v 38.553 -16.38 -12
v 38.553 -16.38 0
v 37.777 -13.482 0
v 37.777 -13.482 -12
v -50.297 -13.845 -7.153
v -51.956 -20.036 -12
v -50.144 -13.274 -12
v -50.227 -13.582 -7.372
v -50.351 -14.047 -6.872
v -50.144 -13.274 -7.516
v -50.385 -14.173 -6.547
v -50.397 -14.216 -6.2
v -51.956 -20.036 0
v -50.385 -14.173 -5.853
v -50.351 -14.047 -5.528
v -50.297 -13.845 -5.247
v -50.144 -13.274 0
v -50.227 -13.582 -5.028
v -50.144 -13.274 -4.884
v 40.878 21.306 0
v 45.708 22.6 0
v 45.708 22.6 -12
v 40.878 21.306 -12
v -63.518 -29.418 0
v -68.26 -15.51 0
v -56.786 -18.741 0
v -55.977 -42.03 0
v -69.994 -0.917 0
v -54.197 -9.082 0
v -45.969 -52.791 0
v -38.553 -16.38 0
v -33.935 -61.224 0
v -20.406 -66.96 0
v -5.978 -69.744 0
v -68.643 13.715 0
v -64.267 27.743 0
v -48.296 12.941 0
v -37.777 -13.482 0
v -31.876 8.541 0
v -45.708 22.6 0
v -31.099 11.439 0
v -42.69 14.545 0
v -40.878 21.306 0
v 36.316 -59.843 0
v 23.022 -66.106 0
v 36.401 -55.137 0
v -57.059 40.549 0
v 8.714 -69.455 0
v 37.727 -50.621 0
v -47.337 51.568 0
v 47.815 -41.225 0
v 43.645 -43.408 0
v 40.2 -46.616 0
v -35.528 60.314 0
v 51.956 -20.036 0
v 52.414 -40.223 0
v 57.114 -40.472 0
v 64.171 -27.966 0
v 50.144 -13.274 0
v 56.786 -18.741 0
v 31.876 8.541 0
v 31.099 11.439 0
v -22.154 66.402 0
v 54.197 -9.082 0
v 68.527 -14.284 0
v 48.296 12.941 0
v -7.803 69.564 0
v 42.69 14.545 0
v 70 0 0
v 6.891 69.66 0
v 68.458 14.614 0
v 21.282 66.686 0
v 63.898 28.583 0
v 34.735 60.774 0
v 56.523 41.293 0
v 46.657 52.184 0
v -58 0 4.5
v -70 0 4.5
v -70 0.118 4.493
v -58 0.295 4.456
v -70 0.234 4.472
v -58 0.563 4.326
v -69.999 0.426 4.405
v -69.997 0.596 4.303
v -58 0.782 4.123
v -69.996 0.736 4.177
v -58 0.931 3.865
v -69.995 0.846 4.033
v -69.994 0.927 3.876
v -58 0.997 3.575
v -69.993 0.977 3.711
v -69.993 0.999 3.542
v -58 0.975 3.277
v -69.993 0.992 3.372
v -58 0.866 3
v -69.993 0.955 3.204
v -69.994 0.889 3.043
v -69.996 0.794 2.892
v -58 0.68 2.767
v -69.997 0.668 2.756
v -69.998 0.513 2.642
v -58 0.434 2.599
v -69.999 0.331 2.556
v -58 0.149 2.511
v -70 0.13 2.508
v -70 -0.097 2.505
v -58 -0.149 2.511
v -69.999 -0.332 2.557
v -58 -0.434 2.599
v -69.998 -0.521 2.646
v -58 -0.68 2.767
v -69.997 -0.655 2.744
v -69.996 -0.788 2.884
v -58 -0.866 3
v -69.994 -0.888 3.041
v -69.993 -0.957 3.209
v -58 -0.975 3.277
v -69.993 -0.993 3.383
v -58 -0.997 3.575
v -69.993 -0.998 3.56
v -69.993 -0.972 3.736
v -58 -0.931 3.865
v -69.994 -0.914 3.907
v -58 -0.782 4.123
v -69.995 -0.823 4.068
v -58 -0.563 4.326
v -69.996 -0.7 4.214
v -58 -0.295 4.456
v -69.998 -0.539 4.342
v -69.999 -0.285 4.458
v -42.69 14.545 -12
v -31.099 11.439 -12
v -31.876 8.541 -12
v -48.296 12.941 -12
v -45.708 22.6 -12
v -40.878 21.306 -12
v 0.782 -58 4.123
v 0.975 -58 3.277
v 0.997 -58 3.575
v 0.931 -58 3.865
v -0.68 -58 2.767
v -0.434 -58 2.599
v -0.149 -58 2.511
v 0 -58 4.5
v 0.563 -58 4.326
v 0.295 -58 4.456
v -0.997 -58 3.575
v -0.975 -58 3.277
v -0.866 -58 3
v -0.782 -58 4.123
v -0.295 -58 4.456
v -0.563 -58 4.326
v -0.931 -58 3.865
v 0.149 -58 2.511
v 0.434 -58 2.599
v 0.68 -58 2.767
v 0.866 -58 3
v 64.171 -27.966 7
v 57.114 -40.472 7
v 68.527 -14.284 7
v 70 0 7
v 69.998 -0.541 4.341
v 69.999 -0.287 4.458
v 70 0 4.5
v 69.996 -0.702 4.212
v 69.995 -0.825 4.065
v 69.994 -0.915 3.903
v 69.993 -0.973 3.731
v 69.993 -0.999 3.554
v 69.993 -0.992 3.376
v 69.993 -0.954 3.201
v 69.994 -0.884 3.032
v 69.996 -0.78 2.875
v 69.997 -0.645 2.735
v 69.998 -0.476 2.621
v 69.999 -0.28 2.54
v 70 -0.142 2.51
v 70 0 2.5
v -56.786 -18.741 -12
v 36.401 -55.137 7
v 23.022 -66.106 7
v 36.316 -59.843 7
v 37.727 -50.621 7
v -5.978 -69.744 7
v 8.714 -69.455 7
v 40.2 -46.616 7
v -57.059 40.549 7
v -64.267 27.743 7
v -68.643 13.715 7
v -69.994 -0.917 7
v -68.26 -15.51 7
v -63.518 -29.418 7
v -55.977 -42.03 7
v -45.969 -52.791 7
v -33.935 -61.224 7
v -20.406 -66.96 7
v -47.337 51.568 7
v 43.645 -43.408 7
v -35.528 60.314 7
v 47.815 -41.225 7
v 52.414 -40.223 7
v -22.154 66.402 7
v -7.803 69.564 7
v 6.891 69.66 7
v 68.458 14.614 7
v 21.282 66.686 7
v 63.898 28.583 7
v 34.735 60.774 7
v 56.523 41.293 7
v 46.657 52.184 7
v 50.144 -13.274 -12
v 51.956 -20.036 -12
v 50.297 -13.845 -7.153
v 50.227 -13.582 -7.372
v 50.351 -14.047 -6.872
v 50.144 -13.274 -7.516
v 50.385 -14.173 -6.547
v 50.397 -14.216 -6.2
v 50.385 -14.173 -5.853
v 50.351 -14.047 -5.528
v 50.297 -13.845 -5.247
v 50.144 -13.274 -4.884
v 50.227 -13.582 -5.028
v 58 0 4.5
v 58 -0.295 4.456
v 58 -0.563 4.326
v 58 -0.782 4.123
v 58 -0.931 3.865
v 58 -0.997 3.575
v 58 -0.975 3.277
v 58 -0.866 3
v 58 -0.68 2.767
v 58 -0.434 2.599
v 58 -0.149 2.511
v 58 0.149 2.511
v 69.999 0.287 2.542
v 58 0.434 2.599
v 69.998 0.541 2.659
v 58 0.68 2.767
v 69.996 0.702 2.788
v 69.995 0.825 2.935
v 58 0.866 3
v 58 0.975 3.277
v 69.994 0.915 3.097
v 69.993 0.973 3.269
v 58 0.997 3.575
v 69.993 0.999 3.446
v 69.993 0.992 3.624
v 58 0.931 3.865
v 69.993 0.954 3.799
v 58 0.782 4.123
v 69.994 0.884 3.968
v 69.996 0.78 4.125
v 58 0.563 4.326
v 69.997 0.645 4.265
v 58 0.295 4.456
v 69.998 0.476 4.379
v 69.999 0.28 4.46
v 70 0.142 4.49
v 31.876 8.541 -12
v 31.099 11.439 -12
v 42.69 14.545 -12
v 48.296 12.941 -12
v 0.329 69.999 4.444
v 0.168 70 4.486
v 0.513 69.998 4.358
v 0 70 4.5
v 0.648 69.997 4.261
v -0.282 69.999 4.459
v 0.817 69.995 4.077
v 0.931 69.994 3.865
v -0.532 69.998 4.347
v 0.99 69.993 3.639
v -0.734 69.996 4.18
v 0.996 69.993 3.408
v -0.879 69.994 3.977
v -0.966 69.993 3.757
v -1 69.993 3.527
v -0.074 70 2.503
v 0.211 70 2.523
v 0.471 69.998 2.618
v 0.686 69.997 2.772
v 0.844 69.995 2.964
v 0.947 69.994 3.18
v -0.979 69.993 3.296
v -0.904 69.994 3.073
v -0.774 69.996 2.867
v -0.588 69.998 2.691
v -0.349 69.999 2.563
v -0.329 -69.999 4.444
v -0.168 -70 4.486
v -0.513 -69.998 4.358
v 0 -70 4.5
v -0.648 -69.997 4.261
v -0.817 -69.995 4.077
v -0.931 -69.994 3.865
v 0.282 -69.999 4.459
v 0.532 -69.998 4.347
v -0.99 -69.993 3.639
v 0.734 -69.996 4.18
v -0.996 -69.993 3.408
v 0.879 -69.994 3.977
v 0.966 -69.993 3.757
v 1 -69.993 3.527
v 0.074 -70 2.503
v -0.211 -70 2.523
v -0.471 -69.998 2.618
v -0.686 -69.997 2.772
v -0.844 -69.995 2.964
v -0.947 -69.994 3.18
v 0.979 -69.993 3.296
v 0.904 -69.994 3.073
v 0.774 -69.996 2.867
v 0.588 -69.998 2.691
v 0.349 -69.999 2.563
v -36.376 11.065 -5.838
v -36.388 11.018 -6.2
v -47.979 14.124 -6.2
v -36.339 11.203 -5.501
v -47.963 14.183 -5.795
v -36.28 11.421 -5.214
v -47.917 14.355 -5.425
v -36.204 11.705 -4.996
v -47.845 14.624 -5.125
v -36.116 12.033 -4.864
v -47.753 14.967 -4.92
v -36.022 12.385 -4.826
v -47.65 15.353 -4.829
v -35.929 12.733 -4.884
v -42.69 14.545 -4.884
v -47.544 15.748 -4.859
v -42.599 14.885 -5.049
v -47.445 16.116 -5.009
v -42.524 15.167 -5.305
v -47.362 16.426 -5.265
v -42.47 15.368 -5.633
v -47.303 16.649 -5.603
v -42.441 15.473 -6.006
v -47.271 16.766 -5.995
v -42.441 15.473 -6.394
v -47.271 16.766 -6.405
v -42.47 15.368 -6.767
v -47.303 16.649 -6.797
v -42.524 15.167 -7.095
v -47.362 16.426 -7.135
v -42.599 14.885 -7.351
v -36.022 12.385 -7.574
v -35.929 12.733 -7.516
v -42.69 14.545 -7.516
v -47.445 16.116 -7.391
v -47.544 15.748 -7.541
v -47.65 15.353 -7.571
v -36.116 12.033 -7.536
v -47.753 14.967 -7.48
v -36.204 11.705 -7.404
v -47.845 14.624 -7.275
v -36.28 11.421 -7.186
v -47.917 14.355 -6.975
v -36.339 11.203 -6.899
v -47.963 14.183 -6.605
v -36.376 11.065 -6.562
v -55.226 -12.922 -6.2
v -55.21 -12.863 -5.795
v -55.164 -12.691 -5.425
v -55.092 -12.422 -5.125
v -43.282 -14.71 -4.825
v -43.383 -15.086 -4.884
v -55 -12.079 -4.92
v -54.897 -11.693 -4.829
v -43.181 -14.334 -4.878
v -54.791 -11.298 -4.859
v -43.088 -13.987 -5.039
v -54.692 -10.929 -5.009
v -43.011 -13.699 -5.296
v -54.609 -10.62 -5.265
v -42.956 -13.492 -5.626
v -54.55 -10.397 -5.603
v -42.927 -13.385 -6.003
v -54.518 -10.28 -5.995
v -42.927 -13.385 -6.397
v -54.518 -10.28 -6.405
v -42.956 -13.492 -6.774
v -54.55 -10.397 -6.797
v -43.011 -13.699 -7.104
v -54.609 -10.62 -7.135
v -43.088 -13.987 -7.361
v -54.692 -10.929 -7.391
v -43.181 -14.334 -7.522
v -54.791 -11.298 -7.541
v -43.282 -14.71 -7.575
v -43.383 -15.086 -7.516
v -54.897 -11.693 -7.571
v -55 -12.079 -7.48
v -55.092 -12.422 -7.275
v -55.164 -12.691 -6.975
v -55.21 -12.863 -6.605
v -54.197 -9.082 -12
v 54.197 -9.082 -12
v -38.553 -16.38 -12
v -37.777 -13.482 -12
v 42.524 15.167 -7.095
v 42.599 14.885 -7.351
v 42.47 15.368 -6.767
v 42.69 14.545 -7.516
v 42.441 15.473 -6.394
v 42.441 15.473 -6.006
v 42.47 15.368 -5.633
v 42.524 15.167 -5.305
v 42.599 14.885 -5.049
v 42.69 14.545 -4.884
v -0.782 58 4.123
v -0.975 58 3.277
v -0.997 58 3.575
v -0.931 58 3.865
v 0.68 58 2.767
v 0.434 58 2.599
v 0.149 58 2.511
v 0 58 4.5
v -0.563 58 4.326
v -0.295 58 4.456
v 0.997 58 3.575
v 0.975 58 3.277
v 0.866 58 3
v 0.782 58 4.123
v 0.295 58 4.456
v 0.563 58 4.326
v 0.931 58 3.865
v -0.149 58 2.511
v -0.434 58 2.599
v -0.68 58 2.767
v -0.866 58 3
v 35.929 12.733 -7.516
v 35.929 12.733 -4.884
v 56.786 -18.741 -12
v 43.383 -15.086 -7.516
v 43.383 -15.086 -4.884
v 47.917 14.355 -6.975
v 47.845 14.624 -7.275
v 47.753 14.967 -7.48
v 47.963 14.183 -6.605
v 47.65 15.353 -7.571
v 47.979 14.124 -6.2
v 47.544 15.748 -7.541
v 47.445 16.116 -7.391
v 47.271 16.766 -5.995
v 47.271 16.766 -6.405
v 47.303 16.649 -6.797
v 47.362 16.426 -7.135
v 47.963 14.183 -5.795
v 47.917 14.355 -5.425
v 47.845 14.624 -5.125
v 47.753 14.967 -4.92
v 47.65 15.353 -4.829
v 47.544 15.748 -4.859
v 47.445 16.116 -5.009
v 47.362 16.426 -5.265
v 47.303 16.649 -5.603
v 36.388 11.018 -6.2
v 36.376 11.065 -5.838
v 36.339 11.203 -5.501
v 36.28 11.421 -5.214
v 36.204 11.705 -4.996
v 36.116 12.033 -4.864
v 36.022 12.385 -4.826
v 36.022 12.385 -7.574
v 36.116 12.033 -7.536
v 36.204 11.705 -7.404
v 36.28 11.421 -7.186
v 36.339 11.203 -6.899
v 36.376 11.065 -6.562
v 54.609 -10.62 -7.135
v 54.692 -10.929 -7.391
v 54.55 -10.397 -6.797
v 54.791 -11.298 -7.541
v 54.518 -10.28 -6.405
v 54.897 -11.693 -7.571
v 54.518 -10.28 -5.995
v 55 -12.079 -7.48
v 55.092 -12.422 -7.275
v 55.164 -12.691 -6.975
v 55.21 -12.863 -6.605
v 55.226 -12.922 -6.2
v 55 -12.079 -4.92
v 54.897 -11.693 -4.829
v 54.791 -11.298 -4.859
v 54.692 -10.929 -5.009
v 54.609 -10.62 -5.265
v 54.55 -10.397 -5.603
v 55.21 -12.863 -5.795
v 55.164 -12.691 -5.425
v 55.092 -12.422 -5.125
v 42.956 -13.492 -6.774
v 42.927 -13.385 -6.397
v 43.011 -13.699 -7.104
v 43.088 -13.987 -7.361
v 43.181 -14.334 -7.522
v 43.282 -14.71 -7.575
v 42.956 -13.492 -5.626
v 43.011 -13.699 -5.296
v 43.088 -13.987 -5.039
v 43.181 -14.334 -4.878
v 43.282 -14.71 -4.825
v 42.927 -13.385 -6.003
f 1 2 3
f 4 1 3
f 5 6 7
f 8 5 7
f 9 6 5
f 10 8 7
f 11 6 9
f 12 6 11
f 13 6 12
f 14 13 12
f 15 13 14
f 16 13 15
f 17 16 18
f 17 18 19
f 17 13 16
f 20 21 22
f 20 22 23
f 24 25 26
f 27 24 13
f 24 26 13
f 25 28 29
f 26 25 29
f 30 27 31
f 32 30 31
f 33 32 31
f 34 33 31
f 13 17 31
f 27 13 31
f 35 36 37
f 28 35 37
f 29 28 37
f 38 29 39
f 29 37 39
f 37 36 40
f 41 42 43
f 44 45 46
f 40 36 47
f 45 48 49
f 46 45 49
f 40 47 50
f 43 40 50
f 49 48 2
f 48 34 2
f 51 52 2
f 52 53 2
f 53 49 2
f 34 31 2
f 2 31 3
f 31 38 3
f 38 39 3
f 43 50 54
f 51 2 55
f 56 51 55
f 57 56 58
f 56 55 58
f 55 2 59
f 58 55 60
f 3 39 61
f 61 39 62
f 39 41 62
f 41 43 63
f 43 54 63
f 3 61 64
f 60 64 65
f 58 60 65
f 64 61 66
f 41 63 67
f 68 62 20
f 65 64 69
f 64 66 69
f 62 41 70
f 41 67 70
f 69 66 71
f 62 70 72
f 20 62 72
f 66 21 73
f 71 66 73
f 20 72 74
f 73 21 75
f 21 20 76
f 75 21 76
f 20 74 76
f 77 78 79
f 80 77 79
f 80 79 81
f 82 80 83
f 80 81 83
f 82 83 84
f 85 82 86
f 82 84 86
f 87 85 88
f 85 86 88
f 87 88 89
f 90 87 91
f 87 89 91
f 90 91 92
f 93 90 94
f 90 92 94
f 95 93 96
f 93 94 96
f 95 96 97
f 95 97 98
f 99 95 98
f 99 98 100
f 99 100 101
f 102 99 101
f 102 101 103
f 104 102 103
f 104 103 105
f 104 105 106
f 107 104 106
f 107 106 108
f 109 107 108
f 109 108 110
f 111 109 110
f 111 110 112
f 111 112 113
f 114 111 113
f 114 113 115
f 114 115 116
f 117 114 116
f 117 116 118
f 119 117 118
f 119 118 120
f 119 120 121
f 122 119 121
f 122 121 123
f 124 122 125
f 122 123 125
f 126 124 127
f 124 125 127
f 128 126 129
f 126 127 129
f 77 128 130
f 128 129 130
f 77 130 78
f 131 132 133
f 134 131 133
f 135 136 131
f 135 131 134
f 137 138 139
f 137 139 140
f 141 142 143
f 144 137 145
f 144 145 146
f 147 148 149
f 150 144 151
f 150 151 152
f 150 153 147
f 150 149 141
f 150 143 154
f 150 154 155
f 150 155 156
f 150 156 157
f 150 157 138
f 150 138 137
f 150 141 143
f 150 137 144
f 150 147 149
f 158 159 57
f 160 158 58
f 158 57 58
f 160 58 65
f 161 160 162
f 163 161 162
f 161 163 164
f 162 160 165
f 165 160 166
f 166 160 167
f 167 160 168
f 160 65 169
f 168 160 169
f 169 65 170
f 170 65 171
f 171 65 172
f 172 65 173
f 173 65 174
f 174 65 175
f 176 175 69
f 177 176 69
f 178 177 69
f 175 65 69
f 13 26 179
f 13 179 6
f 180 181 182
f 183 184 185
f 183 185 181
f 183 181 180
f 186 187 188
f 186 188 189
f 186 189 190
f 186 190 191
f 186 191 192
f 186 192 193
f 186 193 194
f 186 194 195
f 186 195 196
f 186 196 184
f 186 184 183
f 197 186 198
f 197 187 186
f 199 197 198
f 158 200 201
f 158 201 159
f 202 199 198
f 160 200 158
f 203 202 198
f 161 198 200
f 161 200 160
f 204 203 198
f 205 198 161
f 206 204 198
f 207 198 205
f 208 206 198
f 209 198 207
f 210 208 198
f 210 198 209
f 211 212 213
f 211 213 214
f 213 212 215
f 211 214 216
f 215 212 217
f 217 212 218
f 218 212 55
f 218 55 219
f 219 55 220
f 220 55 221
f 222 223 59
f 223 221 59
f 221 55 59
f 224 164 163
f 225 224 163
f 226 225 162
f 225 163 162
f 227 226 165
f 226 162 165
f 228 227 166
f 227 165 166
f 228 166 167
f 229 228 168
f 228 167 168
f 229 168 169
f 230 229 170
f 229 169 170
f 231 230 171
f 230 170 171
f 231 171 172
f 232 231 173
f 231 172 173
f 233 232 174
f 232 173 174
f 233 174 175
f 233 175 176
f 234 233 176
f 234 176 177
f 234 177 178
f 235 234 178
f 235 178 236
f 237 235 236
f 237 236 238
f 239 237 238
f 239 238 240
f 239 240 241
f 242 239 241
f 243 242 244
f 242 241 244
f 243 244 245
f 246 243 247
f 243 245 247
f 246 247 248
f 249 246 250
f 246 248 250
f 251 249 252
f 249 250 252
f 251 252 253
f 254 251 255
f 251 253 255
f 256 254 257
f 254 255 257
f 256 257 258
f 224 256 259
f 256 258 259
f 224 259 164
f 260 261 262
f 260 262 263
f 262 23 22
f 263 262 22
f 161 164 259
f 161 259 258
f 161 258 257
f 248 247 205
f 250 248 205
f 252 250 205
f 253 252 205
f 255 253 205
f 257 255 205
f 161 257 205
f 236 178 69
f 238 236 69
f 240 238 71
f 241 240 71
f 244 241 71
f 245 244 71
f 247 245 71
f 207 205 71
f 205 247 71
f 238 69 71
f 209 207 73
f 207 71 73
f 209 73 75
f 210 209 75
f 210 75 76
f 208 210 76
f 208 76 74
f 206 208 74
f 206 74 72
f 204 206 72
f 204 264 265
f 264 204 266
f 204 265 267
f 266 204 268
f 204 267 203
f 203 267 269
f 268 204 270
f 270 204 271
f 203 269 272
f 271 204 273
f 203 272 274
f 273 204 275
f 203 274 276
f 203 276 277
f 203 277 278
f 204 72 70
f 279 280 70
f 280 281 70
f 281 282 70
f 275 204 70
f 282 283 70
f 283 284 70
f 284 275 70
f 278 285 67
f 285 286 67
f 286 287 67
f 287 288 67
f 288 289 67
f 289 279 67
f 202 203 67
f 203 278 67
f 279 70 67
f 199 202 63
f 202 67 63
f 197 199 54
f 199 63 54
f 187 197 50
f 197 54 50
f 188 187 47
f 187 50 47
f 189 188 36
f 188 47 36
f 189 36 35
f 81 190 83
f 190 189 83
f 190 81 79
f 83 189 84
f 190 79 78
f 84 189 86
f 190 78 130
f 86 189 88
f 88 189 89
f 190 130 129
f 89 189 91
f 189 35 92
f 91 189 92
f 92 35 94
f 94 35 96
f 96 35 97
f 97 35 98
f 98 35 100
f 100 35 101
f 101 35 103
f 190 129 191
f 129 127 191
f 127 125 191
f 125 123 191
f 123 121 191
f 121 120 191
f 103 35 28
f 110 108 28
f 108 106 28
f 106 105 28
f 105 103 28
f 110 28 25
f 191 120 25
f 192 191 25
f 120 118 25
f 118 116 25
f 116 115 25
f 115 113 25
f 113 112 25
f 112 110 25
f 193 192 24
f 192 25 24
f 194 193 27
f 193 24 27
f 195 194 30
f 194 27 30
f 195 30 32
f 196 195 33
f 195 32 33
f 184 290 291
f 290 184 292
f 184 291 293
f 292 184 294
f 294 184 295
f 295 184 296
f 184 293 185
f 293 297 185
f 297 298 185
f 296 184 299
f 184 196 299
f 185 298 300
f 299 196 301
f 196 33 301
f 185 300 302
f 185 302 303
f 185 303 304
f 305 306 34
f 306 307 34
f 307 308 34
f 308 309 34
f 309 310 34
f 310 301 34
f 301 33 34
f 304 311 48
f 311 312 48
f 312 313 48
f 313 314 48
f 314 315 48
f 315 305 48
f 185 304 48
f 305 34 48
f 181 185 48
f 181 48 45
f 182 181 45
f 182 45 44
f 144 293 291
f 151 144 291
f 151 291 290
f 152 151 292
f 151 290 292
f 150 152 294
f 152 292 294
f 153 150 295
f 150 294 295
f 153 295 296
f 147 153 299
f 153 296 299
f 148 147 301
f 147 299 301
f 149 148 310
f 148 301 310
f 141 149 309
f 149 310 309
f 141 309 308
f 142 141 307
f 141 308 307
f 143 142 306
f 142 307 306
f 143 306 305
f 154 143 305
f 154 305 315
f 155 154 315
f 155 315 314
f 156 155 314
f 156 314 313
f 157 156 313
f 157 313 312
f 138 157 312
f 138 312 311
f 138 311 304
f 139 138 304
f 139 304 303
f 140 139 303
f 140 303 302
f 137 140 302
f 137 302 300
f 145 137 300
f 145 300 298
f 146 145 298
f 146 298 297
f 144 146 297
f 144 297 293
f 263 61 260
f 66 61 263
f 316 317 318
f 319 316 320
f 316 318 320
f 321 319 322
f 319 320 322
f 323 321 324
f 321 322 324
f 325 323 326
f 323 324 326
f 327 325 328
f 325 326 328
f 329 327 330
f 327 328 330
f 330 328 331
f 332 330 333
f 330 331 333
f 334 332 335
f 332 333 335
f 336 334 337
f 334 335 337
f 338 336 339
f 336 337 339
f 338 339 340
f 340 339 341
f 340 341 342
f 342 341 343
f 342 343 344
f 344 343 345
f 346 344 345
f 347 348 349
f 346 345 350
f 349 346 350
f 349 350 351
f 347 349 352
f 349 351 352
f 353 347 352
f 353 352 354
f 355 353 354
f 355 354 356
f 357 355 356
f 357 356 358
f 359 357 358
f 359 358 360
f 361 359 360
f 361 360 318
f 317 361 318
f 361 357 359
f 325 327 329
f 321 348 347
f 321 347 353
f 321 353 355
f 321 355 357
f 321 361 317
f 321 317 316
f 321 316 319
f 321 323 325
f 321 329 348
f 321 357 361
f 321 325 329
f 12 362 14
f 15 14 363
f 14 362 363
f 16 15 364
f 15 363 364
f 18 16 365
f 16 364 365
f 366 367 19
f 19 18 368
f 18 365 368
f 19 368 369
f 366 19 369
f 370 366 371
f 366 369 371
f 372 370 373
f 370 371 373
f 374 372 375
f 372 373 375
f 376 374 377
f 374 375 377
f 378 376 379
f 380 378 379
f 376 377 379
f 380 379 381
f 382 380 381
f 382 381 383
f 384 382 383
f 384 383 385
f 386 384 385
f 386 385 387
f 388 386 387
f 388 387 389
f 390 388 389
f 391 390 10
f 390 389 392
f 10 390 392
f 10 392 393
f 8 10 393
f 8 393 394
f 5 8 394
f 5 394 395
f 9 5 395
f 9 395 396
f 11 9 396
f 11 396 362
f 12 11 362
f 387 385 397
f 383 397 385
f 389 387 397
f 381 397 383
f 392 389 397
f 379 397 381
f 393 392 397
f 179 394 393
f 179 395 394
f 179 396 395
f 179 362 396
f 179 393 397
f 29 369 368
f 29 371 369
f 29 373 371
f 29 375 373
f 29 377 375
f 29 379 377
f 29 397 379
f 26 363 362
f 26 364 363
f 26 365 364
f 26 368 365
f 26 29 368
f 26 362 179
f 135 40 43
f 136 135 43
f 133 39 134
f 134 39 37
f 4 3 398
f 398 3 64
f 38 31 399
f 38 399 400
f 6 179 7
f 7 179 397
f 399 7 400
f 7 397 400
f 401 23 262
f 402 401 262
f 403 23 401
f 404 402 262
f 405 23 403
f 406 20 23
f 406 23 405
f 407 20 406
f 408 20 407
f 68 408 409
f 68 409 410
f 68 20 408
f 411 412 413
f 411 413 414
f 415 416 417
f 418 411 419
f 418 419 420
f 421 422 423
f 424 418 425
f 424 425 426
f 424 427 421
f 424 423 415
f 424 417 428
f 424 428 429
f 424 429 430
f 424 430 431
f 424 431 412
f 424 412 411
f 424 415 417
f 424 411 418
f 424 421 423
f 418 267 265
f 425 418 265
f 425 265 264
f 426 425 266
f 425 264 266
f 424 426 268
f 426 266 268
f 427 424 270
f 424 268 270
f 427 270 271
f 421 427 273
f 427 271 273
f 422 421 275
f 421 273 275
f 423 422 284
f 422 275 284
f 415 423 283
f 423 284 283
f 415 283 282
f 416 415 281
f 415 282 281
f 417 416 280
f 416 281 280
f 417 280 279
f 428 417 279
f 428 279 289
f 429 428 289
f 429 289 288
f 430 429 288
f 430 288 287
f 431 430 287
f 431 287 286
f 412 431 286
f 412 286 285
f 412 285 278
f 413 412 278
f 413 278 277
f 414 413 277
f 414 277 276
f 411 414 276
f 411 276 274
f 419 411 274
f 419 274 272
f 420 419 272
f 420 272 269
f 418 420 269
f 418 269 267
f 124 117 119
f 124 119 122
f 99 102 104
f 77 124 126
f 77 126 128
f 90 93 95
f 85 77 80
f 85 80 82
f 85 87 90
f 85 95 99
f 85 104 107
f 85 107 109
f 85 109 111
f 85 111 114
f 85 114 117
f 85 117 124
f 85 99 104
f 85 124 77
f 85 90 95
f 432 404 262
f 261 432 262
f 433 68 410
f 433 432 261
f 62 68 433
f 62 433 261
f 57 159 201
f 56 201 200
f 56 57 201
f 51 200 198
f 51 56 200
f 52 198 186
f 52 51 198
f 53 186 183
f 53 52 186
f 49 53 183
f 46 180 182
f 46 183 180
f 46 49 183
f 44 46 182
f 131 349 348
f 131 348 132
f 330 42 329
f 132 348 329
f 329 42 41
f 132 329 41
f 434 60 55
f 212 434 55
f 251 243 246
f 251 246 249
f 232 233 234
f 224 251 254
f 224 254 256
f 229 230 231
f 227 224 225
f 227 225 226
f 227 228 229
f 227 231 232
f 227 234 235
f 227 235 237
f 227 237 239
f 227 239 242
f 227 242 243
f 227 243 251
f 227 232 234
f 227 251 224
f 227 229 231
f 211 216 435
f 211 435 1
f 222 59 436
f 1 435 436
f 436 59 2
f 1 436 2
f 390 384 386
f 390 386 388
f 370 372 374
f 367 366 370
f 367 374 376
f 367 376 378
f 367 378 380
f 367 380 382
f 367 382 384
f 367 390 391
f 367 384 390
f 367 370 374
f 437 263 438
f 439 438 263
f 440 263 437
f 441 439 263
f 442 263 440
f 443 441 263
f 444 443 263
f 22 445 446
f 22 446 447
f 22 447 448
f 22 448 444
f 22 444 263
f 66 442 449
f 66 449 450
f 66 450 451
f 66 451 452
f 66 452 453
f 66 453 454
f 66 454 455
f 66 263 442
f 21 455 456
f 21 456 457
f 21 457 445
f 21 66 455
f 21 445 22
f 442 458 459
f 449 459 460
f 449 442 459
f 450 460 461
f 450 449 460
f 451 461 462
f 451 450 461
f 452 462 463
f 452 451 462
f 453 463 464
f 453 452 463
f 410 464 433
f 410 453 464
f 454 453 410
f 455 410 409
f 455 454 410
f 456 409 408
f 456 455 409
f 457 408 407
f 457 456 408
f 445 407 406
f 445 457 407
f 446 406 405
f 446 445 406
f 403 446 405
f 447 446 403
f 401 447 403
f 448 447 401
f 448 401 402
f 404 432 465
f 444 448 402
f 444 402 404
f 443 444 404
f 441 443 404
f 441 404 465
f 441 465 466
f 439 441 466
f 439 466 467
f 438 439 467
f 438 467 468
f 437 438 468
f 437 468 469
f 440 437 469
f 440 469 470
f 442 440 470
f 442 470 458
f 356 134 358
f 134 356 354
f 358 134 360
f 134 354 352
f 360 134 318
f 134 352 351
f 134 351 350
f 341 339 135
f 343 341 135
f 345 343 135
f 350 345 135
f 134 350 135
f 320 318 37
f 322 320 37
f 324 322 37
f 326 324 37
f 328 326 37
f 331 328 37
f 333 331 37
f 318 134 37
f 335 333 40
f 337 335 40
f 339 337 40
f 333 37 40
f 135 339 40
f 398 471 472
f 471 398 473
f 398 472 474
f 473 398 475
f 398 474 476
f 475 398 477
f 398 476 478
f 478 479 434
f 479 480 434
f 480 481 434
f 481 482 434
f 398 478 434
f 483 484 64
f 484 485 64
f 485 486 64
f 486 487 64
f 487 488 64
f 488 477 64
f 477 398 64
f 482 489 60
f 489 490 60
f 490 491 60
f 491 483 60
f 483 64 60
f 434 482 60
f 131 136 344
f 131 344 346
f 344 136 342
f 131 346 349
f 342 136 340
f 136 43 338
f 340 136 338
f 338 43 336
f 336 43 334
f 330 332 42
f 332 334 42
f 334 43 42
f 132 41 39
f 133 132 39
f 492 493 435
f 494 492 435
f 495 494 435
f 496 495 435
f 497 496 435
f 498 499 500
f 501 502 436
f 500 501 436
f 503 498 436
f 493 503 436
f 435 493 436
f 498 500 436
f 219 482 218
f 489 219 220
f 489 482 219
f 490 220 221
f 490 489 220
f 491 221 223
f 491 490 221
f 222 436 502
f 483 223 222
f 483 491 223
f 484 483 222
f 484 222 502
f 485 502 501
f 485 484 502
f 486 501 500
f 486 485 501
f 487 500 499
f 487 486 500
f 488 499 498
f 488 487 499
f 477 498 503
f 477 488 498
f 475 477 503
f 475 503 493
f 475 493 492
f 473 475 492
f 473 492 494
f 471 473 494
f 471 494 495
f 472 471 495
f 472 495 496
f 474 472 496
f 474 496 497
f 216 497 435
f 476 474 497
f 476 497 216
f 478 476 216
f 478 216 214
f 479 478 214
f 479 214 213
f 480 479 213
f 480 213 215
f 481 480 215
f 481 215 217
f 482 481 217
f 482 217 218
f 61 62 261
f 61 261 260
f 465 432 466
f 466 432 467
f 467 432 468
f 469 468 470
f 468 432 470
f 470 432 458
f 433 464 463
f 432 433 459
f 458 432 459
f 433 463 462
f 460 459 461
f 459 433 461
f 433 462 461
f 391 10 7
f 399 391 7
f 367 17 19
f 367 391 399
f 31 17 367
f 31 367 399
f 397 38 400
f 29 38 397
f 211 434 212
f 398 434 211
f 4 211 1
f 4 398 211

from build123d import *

# Parameters (mm, degrees)
SKETCH1_R           = 70
BOSS_EXTRUDE1_DEPTH = 7
SKETCH3_R           = 1
CUT_EXTRUDE1_DEPTH  = 12
CIRPATTERN1_COUNT   = 4
BOSS_EXTRUDE2_DEPTH = 12
SKETCH5_R           = 1.375
CUT_EXTRUDE2_DEPTH  = 12
SKETCH6_R           = 1.375
CUT_EXTRUDE3_DEPTH  = 12
CUT_EXTRUDE4_DEPTH  = 12


with BuildPart() as part:
    # Sketch1 → Boss-Extrude1 (new body)
    with BuildSketch(Plane.XY):
        Circle(SKETCH1_R)
    extrude(amount=BOSS_EXTRUDE1_DEPTH)

    # Sketch3 → Cut-Extrude1 (cut)
    with BuildSketch(Plane(origin=(0, 70, 0), x_dir=(1, 0, 0), z_dir=(0, 1, 0))):
        with Locations(Location((0, -3.5, 0), (0, 0, 270))):
            Circle(SKETCH3_R)
    cut_extrude1 = extrude(amount=-CUT_EXTRUDE1_DEPTH, mode=Mode.SUBTRACT)

    # CirPattern1: Cut-Extrude1 ×4 about axis
    cirpattern1_axis = Axis((0, 0, 0), (0, 0, 1))
    for i in range(1, CIRPATTERN1_COUNT):
        add(cut_extrude1.rotate(cirpattern1_axis, i * 360 / CIRPATTERN1_COUNT), mode=Mode.SUBTRACT)

    # Sketch4 → Boss-Extrude2 (add)
    with BuildSketch(Plane(origin=(0, 0, 0), x_dir=(-1, 0, 0), z_dir=(0, 0, -1))):
        Polygon((31.875552268, 8.541028488), (48.296291314, 12.940952255), (45.708100863, 22.600210518), (40.878471732, 21.306115293), (42.690205048, 14.544634508), (31.099095132, 11.438805967), align=None)
        Polygon((56.785555994, -18.741414847), (51.955926862, -20.035510073), (50.144193547, -13.274029289), (38.553083631, -16.37985783), (37.776626496, -13.482080351), (54.197365543, -9.082156584), align=None)
    boss_extrude2 = extrude(amount=BOSS_EXTRUDE2_DEPTH)

    # Mirror1: Boss-Extrude2 across plane
    add(boss_extrude2.mirror(Plane(origin=(0, 0, 0), x_dir=(0, 0, 1), z_dir=(1, 0, 0))))

    # Sketch5 → Cut-Extrude2 (cut)
    with BuildSketch(Plane(origin=(-48.296291314, 12.940952255, 0), x_dir=(0, 0, 1), z_dir=(-0.9659258262890689, 0.2588190451025187, 0))):
        with Locations(Location((-6.2, -25.4, 0), (0, 0, 270))):
            Circle(SKETCH5_R)
    cut_extrude2 = extrude(amount=-CUT_EXTRUDE2_DEPTH, mode=Mode.SUBTRACT)

    # Sketch6 → Cut-Extrude3 (cut)
    with BuildSketch(Plane(origin=(-48.296291314, 12.940952255, 0), x_dir=(0, 0, 1), z_dir=(-0.9659258262890691, 0.2588190451025179, 0))):
        with Locations(Location((-6.2, 2.6, 0), (0, 0, 270))):
            Circle(SKETCH6_R)
    cut_extrude3 = extrude(amount=-CUT_EXTRUDE3_DEPTH, mode=Mode.SUBTRACT)

    # Mirror2: Cut-Extrude2, Cut-Extrude3 across plane
    add(cut_extrude2.mirror(Plane(origin=(0, 0, 0), x_dir=(0, 0, 1), z_dir=(1, 0, 0))), mode=Mode.SUBTRACT)
    add(cut_extrude3.mirror(Plane(origin=(0, 0, 0), x_dir=(0, 0, 1), z_dir=(1, 0, 0))), mode=Mode.SUBTRACT)

    # Sketch7 → Cut-Extrude4 (cut)
    with BuildSketch(Plane(origin=(0, 0, 0), x_dir=(-1, 0, 0), z_dir=(0, 0, -1))):
        with BuildLine():
            ThreePointArc((-57.113972469, -40.472140403), (-41.814961007, -44.896509701), (-36.315733397, -59.842856782))
            ThreePointArc((-36.315733397, -59.842856782), (-47.708318434, -51.224177419), (-57.113972469, -40.472140403))
        make_face()
    extrude(amount=-CUT_EXTRUDE4_DEPTH, mode=Mode.SUBTRACT)


solid = part.part
